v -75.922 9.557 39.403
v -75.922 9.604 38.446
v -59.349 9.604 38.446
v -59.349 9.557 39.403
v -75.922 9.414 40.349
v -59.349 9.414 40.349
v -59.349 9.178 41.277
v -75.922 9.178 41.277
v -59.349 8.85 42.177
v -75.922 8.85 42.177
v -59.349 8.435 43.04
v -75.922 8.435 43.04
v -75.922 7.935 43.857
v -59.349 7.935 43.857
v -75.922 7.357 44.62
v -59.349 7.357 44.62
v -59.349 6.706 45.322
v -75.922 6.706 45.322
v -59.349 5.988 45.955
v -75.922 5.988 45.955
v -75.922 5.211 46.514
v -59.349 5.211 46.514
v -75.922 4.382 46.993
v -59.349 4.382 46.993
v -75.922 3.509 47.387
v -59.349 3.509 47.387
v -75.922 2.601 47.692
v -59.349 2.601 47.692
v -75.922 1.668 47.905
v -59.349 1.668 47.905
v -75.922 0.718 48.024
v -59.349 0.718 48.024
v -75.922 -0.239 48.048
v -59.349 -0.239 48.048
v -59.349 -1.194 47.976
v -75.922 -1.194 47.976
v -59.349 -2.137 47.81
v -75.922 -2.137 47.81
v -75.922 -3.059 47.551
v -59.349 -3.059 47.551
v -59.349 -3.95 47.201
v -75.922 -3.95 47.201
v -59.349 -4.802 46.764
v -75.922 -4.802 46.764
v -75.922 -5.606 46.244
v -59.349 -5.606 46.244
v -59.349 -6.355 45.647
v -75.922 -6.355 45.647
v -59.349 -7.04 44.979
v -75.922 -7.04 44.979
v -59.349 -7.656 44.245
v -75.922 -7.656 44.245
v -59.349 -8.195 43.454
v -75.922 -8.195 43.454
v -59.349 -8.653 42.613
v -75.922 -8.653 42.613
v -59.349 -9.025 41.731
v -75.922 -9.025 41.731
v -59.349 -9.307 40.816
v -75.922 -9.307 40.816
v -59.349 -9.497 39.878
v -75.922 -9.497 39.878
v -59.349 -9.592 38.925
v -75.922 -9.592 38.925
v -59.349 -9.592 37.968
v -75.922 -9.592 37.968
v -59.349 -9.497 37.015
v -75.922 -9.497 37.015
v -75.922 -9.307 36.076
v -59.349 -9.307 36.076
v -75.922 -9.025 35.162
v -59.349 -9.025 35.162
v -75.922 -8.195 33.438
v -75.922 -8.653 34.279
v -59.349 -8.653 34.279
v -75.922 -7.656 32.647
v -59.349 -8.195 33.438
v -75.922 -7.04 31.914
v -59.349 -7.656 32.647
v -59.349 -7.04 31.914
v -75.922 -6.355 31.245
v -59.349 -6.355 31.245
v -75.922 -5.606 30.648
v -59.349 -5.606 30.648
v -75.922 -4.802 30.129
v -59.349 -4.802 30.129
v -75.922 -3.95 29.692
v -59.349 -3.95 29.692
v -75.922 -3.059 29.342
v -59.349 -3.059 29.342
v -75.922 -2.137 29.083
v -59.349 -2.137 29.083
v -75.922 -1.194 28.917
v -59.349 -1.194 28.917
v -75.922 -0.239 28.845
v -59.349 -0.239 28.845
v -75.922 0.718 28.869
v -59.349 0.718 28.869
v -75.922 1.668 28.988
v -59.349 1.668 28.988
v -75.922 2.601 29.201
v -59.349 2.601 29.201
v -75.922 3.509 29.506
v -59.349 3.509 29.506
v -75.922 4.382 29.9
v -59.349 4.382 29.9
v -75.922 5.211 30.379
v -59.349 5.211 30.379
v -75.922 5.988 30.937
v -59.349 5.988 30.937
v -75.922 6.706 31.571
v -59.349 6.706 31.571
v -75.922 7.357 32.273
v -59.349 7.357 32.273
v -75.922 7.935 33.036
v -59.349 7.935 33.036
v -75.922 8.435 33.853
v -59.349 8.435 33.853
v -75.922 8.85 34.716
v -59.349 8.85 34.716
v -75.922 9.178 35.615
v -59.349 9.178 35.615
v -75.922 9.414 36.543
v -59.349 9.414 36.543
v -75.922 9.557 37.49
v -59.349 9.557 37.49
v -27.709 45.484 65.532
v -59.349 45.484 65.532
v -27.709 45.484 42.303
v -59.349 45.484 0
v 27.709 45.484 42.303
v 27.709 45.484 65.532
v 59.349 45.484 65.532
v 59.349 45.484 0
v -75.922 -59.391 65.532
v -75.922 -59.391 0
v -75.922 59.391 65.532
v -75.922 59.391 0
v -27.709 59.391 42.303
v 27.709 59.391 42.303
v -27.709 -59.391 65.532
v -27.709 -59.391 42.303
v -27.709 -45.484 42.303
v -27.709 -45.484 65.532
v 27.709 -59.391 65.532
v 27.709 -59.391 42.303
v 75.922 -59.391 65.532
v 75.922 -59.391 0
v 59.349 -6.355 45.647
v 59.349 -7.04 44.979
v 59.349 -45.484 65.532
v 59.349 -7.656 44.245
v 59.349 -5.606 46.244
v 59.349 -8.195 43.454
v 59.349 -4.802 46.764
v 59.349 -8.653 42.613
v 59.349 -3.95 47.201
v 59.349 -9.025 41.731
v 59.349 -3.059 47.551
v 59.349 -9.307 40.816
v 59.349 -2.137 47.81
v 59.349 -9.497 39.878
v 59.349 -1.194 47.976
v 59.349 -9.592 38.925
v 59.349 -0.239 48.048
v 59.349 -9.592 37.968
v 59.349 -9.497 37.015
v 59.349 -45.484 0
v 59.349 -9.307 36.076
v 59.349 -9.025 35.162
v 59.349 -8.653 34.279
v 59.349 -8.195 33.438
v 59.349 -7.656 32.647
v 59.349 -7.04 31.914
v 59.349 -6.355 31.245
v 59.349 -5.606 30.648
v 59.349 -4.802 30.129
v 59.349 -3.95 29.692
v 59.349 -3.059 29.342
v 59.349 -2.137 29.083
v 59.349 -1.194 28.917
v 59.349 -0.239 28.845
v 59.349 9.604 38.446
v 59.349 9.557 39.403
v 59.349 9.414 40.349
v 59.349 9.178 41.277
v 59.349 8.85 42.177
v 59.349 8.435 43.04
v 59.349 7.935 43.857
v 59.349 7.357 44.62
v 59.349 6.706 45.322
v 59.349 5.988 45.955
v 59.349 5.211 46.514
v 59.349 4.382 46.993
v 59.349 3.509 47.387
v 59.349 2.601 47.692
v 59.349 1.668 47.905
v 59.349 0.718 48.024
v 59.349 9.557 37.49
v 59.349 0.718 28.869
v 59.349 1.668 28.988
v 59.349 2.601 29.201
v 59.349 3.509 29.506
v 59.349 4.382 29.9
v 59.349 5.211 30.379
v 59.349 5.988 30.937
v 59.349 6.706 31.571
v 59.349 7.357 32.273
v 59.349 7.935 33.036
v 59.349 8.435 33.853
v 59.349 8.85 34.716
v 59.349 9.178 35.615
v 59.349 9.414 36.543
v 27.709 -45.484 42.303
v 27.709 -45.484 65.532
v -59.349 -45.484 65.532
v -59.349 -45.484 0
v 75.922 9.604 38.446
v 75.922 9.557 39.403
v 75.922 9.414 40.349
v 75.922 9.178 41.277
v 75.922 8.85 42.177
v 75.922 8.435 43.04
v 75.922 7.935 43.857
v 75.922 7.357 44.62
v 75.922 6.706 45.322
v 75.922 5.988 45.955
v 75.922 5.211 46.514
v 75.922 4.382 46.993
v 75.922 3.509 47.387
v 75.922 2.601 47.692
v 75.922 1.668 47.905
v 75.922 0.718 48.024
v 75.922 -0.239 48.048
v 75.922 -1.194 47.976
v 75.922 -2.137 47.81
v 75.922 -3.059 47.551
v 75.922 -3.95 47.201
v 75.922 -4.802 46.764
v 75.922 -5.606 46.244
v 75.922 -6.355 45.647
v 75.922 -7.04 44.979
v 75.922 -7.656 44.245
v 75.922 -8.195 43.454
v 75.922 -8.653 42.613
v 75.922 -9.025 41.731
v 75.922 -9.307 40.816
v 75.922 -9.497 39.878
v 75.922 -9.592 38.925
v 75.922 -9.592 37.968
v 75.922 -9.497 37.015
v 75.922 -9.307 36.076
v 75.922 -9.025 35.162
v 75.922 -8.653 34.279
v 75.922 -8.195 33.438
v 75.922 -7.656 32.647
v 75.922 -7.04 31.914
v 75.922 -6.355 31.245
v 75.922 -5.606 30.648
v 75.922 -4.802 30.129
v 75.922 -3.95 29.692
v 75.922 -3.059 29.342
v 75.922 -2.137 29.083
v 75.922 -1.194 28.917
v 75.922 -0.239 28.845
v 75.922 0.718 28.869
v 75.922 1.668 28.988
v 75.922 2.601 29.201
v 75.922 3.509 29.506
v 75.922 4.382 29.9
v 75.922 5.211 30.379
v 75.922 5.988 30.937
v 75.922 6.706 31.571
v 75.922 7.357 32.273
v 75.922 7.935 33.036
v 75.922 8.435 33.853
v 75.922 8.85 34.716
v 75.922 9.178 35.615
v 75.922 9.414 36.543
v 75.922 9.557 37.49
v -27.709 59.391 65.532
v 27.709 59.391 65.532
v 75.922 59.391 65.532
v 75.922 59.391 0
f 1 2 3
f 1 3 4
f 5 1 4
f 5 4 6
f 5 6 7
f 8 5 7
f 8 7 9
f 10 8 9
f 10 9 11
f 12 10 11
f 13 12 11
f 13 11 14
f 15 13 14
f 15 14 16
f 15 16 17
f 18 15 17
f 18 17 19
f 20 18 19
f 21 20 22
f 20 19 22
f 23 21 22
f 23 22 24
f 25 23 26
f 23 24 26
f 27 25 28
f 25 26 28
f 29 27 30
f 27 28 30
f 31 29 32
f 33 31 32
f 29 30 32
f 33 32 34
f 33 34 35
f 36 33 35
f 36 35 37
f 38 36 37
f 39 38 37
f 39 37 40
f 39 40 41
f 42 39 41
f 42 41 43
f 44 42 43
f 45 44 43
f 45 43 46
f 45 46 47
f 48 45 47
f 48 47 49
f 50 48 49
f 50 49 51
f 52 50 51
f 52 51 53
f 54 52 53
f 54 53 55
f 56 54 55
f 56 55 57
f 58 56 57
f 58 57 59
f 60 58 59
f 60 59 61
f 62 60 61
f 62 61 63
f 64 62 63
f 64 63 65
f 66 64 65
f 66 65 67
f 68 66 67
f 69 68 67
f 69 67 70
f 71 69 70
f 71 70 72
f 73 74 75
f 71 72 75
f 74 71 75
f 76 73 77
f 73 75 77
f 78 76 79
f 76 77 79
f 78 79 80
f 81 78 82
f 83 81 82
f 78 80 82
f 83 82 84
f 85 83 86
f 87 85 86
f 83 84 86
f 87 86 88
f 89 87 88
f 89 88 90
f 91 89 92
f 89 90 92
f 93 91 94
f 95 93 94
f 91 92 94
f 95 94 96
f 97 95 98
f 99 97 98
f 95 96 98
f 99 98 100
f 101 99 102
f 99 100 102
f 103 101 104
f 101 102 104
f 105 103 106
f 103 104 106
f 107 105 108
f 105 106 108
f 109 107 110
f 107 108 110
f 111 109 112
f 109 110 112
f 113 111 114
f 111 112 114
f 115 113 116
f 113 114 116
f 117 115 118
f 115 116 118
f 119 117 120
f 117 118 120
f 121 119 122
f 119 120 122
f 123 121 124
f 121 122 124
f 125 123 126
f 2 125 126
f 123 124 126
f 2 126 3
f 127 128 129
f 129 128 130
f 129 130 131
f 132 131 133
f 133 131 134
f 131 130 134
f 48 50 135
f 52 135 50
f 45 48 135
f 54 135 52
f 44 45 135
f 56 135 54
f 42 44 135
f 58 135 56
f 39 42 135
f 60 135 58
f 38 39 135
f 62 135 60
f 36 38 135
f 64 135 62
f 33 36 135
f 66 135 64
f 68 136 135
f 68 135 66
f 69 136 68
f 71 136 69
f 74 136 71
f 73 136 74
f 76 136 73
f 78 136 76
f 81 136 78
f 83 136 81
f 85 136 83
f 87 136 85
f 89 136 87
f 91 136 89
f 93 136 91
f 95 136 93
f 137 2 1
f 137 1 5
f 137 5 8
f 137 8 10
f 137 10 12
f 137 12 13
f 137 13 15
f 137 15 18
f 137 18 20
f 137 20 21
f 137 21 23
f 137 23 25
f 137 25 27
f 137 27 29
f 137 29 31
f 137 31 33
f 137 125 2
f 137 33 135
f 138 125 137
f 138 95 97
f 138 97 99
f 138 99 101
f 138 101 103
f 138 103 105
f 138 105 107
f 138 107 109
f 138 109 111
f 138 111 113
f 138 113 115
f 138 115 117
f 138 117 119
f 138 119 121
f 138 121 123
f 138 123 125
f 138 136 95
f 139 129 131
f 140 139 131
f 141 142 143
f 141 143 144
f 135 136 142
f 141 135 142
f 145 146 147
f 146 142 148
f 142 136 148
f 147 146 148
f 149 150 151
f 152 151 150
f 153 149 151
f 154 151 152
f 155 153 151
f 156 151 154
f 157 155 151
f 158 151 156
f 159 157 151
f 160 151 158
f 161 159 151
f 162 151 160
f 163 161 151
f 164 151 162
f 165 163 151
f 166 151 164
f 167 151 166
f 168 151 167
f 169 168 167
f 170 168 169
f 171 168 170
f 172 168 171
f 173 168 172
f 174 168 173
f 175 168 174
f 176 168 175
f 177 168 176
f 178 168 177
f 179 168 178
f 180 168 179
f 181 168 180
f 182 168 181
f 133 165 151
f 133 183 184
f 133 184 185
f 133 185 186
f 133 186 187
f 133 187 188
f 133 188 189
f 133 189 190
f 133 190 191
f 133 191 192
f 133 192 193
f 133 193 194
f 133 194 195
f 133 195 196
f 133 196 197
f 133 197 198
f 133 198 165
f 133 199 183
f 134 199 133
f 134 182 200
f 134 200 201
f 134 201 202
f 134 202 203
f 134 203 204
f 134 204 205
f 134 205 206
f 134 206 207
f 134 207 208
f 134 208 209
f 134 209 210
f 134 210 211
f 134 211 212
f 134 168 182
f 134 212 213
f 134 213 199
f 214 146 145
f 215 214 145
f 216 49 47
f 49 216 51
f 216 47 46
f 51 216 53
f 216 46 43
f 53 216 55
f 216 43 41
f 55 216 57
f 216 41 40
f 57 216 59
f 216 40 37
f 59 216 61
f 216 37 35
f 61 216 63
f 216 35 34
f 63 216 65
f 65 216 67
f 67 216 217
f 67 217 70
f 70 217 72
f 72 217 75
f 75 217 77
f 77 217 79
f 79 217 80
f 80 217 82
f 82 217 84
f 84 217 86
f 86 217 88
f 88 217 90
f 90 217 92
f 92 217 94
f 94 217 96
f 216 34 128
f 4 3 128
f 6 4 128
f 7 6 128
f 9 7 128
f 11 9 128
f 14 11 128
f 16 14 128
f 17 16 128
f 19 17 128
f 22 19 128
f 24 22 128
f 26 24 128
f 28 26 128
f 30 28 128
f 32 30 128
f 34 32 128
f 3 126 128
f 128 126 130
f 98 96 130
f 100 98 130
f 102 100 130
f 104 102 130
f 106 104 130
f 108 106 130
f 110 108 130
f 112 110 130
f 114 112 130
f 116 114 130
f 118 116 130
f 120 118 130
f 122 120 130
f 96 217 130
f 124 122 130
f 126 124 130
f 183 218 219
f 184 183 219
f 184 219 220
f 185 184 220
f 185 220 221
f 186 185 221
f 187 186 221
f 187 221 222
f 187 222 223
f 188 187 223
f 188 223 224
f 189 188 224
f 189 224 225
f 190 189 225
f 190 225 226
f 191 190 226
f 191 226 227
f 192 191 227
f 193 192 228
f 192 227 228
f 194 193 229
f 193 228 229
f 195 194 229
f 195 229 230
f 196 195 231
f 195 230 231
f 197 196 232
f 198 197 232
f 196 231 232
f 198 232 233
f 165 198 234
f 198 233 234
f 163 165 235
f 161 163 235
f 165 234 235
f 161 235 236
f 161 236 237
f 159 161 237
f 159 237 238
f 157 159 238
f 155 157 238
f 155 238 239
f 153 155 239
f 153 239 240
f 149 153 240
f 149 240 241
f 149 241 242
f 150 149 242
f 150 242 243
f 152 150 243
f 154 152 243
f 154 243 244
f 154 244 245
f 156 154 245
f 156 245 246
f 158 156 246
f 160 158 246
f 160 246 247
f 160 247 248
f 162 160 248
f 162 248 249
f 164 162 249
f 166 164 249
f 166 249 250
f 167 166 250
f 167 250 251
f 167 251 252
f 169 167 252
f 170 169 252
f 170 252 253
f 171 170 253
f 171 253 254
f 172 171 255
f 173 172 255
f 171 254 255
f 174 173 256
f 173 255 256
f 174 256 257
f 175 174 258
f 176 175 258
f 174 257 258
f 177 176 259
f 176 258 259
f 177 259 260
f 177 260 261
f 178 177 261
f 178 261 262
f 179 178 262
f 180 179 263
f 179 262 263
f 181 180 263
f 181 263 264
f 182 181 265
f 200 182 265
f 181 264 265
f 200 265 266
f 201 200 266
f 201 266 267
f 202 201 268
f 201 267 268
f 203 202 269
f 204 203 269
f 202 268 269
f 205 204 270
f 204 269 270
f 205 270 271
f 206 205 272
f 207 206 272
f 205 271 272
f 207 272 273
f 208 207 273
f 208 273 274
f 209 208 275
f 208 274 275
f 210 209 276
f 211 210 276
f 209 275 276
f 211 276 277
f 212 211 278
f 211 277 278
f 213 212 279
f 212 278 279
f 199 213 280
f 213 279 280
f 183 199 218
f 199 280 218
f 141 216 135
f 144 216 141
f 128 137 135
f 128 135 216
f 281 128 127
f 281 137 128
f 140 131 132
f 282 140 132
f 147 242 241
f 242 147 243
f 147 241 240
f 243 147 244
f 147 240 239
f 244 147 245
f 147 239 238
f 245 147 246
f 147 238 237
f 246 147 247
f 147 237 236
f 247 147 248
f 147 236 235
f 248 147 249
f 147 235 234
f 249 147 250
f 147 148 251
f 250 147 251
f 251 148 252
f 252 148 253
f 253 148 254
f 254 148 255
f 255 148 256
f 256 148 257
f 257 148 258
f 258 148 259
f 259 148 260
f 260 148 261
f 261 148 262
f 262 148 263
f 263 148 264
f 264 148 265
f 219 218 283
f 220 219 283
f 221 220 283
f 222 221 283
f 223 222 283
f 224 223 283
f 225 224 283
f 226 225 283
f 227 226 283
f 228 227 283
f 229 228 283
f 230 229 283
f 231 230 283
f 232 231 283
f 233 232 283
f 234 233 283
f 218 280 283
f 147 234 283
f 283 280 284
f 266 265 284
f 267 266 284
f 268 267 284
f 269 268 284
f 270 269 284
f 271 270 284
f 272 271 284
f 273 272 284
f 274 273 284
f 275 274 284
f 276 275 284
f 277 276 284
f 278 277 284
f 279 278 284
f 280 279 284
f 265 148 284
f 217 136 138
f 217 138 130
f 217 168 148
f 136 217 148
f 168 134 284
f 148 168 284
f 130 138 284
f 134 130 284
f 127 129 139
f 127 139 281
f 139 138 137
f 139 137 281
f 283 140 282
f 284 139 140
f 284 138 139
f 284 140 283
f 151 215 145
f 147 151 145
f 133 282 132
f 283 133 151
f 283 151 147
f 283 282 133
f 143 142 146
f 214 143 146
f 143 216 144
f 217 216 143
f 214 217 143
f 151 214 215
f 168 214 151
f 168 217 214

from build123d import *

# Parameters (mm, degrees)
F0_W     = 151.84383
F0_H     = 118.781612
F0_W_2   = 118.697516
F0_H_2   = 90.967916
F1_DEPTH = 50.8
F2_DEPTH = 65.532
F3_W     = 55.418182
F3_H     = 23.22946
F4_DEPTH = 118.782611
F5_R     = 9.604265
F6_DEPTH = 151.844831


with BuildPart() as f1:
    # F0 (on Top) → F1 (new body)
    with BuildSketch(Plane.XY):
        Rectangle(F0_W, F0_H)
        Rectangle(F0_W_2, F0_H_2, mode=Mode.SUBTRACT)
    extrude(amount=F1_DEPTH)

    # F0 (on Top) → F2 (join)
    with BuildSketch(Plane.XY):
        Rectangle(F0_W, F0_H)
        Rectangle(F0_W_2, F0_H_2, mode=Mode.SUBTRACT)
    extrude(amount=F2_DEPTH)

    # F3 (on face) → F4 (cut, through all)
    with BuildSketch(Plane.XZ.offset(59.390806)):
        with Locations((0, 53.91727)):
            Rectangle(F3_W, F3_H)
    extrude(amount=-F4_DEPTH, mode=Mode.SUBTRACT)

    # F5 (on face) → F6 (cut, through all)
    with BuildSketch(Plane.YZ.offset(75.921915)):
        with Locations((0, 38.446363)):
            Circle(F5_R)
    extrude(amount=-F6_DEPTH, mode=Mode.SUBTRACT)


solid = f1.part
